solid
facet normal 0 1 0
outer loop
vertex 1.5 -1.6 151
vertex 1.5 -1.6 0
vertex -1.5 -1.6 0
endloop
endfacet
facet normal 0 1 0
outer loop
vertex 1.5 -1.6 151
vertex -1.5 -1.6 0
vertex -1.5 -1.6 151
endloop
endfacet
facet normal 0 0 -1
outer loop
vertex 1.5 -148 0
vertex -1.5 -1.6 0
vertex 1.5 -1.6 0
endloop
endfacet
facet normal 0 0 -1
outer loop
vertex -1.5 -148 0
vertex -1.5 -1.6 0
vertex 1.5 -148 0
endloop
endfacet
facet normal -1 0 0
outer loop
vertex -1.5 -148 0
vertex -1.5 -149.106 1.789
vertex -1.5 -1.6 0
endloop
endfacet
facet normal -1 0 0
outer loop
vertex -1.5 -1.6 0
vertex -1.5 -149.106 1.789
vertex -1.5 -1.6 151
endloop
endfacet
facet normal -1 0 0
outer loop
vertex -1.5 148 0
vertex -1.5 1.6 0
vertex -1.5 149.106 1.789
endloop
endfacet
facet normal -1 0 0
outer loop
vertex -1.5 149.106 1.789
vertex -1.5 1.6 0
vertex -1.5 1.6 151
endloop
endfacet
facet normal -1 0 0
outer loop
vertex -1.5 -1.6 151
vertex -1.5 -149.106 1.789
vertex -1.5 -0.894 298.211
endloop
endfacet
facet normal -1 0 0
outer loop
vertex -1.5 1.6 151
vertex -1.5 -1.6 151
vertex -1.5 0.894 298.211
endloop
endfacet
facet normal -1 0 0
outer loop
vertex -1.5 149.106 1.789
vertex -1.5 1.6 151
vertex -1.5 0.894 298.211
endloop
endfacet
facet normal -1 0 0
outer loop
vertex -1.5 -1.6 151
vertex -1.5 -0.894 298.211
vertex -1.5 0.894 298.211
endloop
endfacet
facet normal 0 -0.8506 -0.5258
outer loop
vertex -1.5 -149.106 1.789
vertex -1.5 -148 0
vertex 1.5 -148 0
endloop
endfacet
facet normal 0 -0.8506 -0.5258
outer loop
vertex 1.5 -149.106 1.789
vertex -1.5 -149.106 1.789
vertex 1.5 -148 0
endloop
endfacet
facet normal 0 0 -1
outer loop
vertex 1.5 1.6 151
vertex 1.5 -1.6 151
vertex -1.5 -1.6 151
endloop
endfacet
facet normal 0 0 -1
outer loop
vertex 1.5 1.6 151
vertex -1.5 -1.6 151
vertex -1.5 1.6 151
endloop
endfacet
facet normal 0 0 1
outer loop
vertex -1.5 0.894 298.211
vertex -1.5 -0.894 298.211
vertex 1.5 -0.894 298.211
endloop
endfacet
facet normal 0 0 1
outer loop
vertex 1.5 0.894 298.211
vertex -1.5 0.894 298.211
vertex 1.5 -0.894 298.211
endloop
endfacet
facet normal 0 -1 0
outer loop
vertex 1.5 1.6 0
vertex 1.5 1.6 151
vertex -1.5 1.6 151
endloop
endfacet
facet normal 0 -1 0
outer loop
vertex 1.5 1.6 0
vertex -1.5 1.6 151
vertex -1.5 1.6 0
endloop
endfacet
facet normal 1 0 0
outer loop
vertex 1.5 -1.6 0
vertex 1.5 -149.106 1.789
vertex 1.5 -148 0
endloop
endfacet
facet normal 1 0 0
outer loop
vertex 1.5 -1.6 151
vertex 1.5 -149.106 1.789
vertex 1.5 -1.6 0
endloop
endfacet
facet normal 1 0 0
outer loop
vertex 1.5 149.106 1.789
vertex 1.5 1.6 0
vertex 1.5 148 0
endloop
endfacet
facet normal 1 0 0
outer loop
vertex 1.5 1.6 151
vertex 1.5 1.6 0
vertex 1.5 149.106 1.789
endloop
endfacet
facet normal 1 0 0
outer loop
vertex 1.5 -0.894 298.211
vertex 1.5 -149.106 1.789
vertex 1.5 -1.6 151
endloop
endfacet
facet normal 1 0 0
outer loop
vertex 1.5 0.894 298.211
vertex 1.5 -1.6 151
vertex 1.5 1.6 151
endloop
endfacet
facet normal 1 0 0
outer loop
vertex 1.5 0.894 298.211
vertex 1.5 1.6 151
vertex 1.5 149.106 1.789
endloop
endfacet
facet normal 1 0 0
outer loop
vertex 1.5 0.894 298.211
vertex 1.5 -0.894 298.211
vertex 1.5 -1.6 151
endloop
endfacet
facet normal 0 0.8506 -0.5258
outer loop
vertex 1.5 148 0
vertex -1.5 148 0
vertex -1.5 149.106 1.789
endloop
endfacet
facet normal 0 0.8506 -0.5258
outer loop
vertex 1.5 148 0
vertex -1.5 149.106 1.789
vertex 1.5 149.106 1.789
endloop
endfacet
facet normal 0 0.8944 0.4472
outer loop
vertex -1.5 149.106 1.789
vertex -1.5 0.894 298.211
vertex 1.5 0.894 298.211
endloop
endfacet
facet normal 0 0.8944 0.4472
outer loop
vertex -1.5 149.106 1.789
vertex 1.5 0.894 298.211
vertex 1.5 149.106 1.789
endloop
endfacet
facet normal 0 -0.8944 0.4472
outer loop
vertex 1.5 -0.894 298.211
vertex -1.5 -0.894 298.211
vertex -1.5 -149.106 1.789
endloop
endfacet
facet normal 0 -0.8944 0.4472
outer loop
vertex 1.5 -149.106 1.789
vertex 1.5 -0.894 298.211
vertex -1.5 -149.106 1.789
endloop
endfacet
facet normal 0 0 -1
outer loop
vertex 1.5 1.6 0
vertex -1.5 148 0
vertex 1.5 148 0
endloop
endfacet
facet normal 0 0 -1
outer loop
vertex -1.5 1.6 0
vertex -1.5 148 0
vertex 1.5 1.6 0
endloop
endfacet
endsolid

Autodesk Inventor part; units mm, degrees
ref_plane "YZ Plane" through (0, 0, 0) normal (1, 0, 0) x (0, 1, 0)
ref_plane "XZ Plane" through (0, 0, 0) normal (0, 1, 0) x (-1, 0, 0)
ref_plane "XY Plane" through (0, 0, 0) normal (0, 0, 1) x (1, 0, 0)
sketch "Sketch1" plane through (0, 0, 0) normal (1, 0, 0) x (0, 1, 0)
  line L0 (150, 0) -> (-150, 0)
  line L1 (0, 0) -> (0, 300)
  line L2 (0, 300) -> (150, 0)
  line L3 (0, 300) -> (-150, 0)
  dimension "d0" = 300
  dimension "d1" = 300
extrude "Plate1" add sketch "Sketch1" along normal mid plane 3
sketch "Sketch3" plane through (1.5, 0, 0) normal (1, 0, 0) x (0, 0, -1)
  line L0 (0, -1.6) -> (-151, -1.6)
  line L1 (-151, -1.6) -> (-151, 1.6)
  line L2 (-151, 1.6) -> (0, 1.6)
  line L3 (0, 1.6) -> (0, -1.6)
  line L4 (0, 150) -> (0, -150) projected
  point P0 (0, 0)
  point P1 (0, 0)
  dimension "d7" = 3.2
  dimension "d8" = 151
extrude "Extrusion2" cut sketch "Sketch3" against normal through all
chamfer "Corner Chamfer1" distance 2 angle 45 1 edges at (0, 0, 300)
chamfer "Corner Chamfer2" distance 2 angle 45 2 edges at (0, -150, 0) (0, 150, 0)
equation "\"d2\" = Thickness"
equation "\"BendReliefWidth\" = Thickness"
equation "\"BendReliefDepth\" = 0.5 * Thickness"
equation "\"CornerReliefSize\" = 4 * Thickness"
equation "\"MinimumRemnant\" = 2 * Thickness"
equation "\"TransitionRadius\" = BendRadius"
equation "\"JacobiRadiusSize\" = BendRadius"
equation "\"GapSize\" = Thickness"
equation "\"Thickness\" = 3"
equation "\"BendRadius\" = 5"
properties part number "MSC 207 CONE BLADE" material "Stainless Steel"
